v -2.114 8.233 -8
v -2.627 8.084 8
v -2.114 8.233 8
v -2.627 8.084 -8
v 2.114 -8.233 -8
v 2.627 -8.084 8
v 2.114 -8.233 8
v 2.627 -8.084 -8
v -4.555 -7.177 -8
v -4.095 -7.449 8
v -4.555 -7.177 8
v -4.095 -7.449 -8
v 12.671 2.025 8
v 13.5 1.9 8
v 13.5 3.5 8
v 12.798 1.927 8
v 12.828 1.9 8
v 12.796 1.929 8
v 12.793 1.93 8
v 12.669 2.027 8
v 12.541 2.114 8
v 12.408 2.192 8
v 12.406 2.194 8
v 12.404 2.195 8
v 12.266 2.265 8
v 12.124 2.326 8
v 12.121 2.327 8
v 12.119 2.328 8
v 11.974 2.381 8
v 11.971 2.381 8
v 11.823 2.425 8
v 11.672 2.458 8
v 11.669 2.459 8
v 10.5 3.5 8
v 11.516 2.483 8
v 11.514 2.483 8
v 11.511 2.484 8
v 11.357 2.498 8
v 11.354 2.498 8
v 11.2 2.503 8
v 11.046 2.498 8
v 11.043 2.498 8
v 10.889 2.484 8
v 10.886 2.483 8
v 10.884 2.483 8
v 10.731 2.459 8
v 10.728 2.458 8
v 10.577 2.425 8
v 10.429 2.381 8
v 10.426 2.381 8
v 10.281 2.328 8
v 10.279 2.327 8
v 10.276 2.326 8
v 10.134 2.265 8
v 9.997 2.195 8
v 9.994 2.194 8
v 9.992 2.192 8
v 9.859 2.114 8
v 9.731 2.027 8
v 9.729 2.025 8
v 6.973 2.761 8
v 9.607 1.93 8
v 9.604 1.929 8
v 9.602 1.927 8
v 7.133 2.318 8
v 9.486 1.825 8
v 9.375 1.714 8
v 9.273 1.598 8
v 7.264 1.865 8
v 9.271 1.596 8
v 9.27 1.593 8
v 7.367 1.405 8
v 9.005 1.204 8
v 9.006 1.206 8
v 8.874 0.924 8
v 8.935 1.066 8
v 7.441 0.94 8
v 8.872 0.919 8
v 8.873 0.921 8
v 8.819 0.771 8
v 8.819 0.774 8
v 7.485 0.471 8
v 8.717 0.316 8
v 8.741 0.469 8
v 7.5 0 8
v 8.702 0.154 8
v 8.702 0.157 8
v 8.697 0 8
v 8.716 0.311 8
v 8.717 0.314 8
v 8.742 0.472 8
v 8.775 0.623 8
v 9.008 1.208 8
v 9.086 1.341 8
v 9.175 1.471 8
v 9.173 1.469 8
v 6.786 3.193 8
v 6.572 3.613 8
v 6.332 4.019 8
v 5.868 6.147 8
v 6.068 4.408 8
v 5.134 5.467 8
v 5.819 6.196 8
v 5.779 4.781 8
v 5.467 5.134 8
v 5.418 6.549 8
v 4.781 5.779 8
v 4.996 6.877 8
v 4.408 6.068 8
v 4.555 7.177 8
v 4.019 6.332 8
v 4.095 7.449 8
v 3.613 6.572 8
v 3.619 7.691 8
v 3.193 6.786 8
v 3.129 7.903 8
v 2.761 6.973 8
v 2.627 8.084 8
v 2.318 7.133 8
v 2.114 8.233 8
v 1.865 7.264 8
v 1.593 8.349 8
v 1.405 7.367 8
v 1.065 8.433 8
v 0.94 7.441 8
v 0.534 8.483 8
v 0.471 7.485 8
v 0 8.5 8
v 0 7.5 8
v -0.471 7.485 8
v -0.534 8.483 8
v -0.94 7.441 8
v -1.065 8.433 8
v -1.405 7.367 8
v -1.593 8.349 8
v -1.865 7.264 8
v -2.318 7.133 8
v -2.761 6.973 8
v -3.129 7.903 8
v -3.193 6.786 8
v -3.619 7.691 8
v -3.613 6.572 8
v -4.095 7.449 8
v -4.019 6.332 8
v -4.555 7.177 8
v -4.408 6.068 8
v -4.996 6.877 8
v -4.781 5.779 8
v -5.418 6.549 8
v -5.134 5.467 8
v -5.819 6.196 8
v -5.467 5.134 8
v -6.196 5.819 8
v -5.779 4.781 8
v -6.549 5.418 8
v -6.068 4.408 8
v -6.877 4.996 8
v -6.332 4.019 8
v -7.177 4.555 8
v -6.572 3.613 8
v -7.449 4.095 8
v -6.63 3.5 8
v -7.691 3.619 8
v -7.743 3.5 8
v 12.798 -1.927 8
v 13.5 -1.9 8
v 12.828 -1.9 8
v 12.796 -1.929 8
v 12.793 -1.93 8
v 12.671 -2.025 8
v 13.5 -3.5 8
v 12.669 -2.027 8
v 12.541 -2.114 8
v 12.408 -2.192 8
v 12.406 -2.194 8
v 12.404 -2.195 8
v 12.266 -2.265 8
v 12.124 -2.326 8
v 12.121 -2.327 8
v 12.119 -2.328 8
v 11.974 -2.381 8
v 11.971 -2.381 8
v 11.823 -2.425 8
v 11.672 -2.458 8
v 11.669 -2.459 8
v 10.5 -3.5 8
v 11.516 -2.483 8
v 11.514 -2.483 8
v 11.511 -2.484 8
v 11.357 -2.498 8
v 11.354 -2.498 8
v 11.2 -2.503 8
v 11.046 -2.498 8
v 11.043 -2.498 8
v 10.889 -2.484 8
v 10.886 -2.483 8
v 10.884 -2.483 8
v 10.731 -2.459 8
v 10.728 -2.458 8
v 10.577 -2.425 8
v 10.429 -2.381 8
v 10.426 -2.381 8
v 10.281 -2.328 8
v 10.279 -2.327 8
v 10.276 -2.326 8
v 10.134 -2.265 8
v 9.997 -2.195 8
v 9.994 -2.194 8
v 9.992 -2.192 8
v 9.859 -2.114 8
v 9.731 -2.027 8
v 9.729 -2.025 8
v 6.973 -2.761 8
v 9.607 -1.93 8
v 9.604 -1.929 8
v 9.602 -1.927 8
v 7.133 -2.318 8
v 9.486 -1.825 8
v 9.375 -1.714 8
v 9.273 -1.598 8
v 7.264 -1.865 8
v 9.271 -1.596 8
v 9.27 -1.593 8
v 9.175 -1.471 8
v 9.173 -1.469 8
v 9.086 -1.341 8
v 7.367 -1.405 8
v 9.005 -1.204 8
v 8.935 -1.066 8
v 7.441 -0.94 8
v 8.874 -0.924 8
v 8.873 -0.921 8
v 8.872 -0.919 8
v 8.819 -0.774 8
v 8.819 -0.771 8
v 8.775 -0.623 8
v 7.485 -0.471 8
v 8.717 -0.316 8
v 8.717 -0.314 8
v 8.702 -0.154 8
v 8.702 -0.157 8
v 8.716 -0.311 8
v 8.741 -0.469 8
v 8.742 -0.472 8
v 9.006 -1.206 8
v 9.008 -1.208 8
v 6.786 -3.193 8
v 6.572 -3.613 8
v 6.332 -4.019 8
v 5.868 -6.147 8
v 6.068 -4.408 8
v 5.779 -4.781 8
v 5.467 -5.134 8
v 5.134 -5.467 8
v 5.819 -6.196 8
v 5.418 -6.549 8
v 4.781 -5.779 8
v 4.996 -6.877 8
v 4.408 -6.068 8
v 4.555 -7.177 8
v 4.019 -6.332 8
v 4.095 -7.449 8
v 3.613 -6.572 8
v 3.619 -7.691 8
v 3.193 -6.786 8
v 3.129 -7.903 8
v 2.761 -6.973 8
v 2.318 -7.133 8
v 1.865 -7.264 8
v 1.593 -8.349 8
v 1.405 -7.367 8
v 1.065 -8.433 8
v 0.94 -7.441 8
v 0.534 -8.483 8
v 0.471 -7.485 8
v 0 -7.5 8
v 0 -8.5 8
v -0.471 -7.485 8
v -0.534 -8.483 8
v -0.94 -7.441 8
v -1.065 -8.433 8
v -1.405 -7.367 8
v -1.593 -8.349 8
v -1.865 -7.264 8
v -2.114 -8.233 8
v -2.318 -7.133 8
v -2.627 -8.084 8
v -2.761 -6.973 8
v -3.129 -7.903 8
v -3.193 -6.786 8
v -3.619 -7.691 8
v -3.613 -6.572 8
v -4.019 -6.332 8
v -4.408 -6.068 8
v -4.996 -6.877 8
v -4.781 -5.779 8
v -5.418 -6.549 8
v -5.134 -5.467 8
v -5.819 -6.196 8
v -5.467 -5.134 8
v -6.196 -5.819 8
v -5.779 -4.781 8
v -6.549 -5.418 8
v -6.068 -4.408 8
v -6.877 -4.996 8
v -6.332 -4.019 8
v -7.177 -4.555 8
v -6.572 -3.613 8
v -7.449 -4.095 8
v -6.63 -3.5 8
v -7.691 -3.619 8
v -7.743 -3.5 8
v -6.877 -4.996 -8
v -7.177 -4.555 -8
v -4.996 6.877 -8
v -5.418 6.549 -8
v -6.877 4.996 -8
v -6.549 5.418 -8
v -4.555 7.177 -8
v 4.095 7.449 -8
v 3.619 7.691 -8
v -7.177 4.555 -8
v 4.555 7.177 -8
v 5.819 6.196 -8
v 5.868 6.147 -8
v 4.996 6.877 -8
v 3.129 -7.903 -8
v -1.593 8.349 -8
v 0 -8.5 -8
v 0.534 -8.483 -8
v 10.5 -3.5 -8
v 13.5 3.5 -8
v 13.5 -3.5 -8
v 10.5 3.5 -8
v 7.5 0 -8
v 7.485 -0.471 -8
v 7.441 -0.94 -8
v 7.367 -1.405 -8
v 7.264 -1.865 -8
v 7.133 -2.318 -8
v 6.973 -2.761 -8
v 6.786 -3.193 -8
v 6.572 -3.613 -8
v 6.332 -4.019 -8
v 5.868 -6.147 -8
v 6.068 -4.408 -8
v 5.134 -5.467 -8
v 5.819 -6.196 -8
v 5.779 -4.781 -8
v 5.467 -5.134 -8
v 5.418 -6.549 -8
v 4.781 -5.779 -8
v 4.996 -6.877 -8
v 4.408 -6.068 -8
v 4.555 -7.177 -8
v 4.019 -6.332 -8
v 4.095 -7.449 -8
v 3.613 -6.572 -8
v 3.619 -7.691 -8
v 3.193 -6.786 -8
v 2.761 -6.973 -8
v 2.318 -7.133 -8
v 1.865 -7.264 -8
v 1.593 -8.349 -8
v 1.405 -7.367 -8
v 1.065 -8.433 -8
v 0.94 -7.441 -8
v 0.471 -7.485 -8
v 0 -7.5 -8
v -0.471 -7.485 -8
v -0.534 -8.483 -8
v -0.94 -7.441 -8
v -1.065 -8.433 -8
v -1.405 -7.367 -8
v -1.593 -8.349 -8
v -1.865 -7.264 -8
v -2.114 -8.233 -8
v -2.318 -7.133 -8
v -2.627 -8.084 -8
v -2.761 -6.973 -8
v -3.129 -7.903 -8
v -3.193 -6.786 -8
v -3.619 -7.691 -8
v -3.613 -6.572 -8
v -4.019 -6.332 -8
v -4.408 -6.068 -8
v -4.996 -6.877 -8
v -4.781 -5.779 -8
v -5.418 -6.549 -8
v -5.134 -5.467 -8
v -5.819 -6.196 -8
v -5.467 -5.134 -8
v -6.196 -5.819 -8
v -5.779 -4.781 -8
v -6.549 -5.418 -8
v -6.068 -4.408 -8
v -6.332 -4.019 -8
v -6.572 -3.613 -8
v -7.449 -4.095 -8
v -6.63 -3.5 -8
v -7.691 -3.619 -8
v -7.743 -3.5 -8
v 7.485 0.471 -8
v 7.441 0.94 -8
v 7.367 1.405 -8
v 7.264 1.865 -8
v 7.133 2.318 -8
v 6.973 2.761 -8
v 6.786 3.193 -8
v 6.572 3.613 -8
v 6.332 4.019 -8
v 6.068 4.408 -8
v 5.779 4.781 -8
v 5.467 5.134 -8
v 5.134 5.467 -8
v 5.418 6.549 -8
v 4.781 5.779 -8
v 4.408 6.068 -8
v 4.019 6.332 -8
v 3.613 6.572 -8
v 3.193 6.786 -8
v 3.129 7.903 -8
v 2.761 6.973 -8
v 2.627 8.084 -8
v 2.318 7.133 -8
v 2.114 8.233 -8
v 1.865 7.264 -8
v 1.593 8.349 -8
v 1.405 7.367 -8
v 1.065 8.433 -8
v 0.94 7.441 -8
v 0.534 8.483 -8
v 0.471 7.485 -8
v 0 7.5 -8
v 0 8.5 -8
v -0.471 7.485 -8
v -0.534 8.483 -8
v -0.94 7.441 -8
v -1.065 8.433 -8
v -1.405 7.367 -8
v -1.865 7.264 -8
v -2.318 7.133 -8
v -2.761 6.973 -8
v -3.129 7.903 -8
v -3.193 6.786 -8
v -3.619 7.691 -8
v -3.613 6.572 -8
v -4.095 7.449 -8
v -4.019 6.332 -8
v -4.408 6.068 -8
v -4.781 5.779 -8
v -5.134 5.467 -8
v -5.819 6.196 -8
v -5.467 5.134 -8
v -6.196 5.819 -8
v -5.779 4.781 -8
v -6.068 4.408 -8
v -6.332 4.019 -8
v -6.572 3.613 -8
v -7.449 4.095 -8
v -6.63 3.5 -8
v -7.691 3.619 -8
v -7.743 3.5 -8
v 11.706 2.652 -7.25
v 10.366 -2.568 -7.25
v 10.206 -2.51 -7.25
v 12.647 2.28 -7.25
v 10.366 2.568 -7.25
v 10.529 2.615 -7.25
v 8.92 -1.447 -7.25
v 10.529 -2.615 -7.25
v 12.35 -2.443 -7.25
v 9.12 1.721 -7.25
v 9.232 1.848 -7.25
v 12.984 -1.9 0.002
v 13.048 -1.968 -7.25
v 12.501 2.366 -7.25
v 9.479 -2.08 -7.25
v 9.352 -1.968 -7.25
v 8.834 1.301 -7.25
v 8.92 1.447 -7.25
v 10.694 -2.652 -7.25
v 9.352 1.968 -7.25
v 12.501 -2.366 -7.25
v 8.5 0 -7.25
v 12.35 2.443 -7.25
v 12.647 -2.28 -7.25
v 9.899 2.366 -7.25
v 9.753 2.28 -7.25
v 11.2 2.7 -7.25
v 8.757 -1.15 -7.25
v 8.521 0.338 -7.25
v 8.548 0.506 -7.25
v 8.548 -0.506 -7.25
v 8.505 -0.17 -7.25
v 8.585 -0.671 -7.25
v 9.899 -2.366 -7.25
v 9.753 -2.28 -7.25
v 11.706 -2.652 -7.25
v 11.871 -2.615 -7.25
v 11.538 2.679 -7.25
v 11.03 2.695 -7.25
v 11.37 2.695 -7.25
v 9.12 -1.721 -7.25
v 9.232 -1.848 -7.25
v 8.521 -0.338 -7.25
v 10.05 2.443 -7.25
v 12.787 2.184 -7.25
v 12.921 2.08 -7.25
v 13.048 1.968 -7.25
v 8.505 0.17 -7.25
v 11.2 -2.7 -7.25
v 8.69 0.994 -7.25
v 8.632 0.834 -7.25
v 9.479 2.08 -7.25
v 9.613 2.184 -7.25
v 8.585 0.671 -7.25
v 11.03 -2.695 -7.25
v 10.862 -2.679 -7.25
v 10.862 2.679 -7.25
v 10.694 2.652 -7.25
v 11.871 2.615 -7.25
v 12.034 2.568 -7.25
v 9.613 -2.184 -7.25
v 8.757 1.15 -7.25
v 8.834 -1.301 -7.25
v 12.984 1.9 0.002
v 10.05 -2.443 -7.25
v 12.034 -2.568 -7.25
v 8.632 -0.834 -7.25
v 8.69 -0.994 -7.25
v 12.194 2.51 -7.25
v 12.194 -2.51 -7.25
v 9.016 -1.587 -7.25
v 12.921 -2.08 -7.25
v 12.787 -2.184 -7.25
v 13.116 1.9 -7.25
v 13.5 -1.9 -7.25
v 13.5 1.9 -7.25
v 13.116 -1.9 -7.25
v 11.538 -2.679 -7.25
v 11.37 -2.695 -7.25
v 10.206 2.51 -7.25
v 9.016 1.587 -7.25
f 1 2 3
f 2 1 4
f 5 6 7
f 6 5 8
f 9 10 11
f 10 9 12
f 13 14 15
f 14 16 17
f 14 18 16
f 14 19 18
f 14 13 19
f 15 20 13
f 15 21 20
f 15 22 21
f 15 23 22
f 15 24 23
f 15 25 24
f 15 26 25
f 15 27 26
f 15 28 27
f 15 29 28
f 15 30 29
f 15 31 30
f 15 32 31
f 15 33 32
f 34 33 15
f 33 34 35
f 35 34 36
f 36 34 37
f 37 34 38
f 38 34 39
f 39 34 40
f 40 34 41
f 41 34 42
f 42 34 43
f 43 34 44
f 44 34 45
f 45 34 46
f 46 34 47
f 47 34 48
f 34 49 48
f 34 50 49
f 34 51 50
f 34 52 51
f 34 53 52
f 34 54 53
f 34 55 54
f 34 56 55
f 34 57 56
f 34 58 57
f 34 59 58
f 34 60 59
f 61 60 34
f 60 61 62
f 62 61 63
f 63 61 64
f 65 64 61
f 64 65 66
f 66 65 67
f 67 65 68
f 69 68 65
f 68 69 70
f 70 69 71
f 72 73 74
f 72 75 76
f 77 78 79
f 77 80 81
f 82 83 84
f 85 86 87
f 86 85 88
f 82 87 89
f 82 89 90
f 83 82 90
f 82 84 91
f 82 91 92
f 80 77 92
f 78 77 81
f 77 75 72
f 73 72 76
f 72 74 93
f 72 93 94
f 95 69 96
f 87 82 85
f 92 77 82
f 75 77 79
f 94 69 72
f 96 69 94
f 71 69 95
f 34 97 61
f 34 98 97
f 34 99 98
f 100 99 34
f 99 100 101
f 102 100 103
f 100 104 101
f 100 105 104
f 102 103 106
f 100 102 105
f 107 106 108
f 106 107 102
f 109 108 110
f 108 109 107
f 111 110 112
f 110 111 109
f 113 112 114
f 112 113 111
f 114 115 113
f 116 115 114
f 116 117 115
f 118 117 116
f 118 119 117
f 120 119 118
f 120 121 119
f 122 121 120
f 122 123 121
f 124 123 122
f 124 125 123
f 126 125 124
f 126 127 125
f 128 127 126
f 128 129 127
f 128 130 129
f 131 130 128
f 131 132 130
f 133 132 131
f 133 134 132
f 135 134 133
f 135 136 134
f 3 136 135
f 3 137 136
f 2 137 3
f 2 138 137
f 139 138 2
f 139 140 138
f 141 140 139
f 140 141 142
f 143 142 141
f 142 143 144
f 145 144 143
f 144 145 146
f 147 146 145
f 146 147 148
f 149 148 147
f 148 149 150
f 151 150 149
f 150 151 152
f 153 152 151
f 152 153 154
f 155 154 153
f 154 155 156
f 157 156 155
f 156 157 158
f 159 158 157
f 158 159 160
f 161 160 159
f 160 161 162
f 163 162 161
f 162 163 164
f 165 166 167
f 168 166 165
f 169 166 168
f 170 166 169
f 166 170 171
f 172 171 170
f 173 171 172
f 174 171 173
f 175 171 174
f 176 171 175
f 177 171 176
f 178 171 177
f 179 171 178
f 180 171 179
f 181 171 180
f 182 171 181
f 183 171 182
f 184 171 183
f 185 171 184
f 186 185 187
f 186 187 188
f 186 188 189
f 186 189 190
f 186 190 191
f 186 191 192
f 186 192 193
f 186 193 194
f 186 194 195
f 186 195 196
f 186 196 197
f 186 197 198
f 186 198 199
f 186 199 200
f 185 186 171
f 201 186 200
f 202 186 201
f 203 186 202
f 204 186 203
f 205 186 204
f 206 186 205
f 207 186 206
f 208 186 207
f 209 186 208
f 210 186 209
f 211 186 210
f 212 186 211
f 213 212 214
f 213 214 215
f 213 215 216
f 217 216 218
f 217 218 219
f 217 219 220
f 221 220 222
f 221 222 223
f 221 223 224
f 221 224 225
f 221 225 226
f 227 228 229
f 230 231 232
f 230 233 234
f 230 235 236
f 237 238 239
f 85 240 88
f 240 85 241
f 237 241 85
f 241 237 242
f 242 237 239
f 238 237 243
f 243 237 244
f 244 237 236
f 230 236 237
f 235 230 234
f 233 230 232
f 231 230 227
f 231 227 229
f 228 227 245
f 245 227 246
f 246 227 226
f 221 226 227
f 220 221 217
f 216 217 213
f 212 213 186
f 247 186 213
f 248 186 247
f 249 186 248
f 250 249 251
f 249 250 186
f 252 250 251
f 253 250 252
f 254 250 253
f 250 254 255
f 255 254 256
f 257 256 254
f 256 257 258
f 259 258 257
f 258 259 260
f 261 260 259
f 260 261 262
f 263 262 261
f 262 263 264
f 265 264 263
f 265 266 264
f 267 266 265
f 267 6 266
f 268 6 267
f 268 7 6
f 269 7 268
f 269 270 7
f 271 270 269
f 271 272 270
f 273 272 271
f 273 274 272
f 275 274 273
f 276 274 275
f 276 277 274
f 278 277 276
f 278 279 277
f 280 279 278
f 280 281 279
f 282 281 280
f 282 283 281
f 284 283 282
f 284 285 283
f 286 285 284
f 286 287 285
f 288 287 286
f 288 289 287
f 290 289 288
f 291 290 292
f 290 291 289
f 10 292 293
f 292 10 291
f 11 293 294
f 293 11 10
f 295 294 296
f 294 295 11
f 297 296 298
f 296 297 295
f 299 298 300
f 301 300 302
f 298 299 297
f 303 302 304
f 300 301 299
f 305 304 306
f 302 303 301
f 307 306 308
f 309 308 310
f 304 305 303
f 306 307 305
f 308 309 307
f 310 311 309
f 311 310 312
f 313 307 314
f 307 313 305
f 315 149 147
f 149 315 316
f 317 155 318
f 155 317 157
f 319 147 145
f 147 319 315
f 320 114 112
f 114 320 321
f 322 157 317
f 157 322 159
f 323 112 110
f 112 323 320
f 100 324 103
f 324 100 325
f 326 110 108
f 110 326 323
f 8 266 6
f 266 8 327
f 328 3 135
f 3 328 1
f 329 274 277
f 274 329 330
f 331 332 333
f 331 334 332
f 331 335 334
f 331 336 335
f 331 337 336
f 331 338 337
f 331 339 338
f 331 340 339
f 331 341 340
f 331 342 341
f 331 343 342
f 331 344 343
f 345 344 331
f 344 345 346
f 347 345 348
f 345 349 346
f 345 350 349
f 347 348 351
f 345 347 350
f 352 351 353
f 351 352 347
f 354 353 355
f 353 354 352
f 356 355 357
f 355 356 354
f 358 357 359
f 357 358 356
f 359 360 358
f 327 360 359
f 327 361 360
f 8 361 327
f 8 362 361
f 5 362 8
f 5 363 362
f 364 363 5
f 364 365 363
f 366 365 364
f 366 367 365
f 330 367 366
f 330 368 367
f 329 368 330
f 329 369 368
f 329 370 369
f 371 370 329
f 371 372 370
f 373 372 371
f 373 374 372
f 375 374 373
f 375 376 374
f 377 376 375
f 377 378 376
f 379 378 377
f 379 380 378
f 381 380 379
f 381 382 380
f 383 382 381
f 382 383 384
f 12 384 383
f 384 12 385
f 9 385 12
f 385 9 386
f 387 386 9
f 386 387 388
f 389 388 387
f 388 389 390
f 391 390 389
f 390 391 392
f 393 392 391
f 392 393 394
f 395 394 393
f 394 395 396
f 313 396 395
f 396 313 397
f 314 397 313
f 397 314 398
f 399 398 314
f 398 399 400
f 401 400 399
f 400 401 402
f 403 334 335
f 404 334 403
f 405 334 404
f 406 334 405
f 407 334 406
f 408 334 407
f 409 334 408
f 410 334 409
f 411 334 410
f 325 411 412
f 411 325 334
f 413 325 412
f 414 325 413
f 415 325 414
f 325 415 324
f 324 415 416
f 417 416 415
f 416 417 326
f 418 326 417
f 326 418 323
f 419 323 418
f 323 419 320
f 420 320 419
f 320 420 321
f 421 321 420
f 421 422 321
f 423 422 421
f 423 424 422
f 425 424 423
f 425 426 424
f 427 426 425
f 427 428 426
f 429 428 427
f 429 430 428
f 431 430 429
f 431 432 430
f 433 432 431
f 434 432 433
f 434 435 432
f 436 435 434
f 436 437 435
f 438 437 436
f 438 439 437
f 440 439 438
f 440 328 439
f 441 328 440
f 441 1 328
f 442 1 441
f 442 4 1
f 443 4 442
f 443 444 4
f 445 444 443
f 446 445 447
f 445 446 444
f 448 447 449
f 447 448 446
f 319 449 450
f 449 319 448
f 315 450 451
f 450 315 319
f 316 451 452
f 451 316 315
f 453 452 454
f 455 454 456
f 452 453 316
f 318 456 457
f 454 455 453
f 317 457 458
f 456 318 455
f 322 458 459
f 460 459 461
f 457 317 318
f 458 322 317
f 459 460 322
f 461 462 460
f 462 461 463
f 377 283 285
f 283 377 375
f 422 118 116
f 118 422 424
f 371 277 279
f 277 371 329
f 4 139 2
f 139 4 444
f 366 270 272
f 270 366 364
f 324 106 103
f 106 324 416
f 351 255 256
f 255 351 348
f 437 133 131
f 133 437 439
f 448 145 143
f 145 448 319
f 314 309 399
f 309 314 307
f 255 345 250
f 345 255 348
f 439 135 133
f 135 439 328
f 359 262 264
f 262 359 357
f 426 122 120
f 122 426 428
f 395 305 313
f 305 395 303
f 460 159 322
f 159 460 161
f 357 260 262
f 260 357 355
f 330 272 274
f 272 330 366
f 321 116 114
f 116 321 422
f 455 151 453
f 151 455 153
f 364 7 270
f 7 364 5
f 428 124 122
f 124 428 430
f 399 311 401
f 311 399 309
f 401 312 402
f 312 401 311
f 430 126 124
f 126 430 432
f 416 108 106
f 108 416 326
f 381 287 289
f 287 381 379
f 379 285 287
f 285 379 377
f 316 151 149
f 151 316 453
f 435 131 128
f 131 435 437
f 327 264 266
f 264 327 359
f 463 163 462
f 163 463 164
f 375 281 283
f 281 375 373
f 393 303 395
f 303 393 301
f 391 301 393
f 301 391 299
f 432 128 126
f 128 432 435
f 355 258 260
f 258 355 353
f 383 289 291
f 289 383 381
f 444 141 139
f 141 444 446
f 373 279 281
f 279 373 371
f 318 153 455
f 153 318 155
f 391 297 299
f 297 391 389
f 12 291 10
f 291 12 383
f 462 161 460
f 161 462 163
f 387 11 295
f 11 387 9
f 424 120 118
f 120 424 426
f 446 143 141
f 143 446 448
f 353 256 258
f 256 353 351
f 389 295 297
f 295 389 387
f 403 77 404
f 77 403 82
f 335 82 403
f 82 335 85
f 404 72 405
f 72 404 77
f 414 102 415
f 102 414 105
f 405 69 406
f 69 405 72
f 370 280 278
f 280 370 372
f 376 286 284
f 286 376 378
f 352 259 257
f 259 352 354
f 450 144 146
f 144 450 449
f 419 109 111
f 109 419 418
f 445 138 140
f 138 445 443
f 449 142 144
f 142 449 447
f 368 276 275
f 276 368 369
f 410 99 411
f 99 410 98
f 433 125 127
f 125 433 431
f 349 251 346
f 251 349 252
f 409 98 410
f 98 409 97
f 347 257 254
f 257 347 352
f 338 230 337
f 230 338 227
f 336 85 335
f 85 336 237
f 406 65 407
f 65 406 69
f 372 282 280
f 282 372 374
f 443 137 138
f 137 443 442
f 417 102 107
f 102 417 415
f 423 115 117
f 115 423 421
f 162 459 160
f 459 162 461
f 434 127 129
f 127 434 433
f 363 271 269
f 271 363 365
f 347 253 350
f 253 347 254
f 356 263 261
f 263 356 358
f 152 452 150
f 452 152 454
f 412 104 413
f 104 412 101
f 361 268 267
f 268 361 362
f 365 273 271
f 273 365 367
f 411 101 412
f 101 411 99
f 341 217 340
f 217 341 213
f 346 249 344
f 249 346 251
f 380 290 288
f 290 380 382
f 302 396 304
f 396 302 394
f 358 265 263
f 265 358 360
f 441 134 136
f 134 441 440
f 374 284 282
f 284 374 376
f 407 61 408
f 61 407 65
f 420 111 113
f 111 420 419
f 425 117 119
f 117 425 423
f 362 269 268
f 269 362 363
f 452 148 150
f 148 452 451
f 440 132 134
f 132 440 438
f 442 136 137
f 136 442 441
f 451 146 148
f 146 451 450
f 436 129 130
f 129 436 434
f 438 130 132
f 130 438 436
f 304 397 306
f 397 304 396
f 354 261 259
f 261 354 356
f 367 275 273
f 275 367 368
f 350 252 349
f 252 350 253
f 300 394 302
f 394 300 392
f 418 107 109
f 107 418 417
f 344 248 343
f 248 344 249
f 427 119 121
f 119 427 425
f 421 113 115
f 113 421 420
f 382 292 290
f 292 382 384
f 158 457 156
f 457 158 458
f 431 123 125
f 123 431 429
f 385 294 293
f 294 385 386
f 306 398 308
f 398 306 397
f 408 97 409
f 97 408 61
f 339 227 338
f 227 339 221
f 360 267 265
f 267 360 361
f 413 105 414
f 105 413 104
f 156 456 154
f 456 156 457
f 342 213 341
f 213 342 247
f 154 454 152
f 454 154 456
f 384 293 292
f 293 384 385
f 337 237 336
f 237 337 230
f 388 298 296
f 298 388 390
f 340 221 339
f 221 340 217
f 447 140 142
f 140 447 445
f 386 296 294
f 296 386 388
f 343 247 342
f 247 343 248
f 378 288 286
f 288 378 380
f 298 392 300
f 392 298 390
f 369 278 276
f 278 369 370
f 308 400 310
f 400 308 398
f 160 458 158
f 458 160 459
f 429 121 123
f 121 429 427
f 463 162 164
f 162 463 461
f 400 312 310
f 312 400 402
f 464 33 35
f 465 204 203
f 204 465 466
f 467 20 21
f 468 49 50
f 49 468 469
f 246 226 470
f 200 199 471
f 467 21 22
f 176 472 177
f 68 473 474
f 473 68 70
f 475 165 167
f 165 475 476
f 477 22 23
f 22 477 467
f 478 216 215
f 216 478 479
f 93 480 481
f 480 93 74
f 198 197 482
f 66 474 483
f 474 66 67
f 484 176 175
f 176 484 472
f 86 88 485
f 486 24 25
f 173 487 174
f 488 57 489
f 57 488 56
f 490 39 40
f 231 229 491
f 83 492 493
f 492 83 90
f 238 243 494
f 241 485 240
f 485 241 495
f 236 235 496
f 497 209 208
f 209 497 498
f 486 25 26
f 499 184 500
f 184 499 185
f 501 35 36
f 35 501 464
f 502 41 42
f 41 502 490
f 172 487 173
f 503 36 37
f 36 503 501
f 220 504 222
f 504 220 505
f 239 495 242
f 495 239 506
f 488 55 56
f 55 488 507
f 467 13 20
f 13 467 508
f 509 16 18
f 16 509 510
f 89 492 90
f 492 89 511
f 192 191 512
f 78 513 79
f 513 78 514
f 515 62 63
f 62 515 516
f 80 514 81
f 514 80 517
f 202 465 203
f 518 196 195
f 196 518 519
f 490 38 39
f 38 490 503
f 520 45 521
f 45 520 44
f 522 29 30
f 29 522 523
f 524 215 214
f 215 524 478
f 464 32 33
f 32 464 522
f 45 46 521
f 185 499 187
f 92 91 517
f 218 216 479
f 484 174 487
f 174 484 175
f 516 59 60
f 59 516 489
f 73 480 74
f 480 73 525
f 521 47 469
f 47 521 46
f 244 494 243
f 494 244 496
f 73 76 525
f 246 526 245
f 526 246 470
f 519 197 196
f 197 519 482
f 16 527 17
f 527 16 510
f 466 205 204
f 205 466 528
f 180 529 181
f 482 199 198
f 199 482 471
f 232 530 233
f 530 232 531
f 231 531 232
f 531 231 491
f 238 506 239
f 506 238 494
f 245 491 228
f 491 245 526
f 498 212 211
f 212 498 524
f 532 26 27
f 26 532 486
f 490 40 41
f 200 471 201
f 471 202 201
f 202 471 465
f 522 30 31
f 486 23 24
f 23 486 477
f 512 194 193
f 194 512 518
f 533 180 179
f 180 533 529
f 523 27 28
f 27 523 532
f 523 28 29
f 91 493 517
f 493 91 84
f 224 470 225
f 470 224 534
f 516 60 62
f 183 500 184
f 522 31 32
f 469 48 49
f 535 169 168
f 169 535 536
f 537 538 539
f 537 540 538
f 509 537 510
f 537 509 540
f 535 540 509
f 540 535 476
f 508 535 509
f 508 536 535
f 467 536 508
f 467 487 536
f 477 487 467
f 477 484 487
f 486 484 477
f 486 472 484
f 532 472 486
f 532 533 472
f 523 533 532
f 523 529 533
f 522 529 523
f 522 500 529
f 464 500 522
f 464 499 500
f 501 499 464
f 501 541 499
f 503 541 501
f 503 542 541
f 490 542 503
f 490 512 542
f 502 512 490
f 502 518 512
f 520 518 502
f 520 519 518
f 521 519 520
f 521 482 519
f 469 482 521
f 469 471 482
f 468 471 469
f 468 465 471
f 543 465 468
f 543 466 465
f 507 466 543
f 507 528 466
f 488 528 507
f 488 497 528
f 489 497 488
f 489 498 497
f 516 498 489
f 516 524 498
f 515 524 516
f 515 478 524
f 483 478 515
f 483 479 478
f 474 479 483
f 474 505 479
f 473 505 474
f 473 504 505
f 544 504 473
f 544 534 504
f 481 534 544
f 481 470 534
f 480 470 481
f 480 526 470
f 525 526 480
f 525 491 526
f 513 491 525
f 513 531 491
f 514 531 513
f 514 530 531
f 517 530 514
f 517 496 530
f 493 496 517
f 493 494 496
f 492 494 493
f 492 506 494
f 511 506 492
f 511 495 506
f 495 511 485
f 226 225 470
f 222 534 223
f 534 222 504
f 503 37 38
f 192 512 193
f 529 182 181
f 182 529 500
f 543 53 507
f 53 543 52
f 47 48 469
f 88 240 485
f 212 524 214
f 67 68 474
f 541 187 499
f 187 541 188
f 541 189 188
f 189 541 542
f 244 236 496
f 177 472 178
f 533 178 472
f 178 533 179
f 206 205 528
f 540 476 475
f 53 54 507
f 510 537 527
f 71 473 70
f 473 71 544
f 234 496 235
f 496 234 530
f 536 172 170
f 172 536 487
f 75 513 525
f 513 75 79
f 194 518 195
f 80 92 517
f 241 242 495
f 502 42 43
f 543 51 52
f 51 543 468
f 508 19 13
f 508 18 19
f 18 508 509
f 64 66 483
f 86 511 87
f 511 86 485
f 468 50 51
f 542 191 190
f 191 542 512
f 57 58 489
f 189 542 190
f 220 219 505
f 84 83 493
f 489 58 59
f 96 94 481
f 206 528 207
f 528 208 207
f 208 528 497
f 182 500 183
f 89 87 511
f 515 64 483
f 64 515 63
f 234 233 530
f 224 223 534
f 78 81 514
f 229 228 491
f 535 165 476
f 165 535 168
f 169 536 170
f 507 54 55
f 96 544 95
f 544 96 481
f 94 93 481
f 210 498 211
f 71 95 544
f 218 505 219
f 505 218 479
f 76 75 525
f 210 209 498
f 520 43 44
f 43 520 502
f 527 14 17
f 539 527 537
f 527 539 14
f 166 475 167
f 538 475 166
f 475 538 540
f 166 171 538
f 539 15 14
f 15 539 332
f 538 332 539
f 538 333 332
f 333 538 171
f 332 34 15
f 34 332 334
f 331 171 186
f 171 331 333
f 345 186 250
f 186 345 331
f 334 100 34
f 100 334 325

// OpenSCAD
$fn=100;
module ring(heigth,radius){
	// the ring itself
	difference(){
		cylinder(h=heigth,r=radius+1,center=true);
		cylinder(h=heigth+1,r=radius,center=true);
		// the hole...
   		rotate([0,0,0]) translate([-radius,0,0]) cube([3,7,heigth+2],center=true);
	}

	// the magnet holder
	rMag = 2.5;
	translate([radius+rMag+0.5,0,0])
	difference(){
		cube([rMag*2+1,rMag*2+2,heigth],center=true);
		translate([0.7,0,0.5]) 
		union(){						
			cylinder(h=heigth-0.5,r1=rMag+0.2,r2=rMag,center=true);	//inner cylinder
			translate([rMag,0,0]) cube([3,3.8,heigth-0.5],center=true);	//upper hole
		}
	}
	// the connection/stabilization thing
	// for radius = 7.5
	translate([radius,-(rMag*2+2)/2,0])		
	linear_extrude(height = heigth, center = true, convexity = 10, twist = 0)
	polygon(points=[[0,0],[-4,-4],[(rMag*2+1)/2,0]], paths=[[0,1,2]]);
	mirror([0,1,0])
	translate([radius,-(rMag*2+2)/2,0])
	linear_extrude(height = heigth, center = true, convexity = 10, twist = 0)
	polygon(points=[[0,0],[-4,-4],[(rMag*2+1)/2,0]], paths=[[0,1,2]]);
}


/* radi for (my)fingers:
	index: 7.5
	middle: 8 
	ring: 7.5
	pinky: 6

	wooden hand:
	index: 7.5
	middle: 7.5 
	ring: 7.5
	pinky: 7	


	dimensions of magnet: 
	radius = 2.5
	length = 15
*/
ring(16,7.5);
//translate([0,0,20])
//cylinder(h=16-0.5,r1=2.5+0.2,r2=2.5-0.1,center=true);
